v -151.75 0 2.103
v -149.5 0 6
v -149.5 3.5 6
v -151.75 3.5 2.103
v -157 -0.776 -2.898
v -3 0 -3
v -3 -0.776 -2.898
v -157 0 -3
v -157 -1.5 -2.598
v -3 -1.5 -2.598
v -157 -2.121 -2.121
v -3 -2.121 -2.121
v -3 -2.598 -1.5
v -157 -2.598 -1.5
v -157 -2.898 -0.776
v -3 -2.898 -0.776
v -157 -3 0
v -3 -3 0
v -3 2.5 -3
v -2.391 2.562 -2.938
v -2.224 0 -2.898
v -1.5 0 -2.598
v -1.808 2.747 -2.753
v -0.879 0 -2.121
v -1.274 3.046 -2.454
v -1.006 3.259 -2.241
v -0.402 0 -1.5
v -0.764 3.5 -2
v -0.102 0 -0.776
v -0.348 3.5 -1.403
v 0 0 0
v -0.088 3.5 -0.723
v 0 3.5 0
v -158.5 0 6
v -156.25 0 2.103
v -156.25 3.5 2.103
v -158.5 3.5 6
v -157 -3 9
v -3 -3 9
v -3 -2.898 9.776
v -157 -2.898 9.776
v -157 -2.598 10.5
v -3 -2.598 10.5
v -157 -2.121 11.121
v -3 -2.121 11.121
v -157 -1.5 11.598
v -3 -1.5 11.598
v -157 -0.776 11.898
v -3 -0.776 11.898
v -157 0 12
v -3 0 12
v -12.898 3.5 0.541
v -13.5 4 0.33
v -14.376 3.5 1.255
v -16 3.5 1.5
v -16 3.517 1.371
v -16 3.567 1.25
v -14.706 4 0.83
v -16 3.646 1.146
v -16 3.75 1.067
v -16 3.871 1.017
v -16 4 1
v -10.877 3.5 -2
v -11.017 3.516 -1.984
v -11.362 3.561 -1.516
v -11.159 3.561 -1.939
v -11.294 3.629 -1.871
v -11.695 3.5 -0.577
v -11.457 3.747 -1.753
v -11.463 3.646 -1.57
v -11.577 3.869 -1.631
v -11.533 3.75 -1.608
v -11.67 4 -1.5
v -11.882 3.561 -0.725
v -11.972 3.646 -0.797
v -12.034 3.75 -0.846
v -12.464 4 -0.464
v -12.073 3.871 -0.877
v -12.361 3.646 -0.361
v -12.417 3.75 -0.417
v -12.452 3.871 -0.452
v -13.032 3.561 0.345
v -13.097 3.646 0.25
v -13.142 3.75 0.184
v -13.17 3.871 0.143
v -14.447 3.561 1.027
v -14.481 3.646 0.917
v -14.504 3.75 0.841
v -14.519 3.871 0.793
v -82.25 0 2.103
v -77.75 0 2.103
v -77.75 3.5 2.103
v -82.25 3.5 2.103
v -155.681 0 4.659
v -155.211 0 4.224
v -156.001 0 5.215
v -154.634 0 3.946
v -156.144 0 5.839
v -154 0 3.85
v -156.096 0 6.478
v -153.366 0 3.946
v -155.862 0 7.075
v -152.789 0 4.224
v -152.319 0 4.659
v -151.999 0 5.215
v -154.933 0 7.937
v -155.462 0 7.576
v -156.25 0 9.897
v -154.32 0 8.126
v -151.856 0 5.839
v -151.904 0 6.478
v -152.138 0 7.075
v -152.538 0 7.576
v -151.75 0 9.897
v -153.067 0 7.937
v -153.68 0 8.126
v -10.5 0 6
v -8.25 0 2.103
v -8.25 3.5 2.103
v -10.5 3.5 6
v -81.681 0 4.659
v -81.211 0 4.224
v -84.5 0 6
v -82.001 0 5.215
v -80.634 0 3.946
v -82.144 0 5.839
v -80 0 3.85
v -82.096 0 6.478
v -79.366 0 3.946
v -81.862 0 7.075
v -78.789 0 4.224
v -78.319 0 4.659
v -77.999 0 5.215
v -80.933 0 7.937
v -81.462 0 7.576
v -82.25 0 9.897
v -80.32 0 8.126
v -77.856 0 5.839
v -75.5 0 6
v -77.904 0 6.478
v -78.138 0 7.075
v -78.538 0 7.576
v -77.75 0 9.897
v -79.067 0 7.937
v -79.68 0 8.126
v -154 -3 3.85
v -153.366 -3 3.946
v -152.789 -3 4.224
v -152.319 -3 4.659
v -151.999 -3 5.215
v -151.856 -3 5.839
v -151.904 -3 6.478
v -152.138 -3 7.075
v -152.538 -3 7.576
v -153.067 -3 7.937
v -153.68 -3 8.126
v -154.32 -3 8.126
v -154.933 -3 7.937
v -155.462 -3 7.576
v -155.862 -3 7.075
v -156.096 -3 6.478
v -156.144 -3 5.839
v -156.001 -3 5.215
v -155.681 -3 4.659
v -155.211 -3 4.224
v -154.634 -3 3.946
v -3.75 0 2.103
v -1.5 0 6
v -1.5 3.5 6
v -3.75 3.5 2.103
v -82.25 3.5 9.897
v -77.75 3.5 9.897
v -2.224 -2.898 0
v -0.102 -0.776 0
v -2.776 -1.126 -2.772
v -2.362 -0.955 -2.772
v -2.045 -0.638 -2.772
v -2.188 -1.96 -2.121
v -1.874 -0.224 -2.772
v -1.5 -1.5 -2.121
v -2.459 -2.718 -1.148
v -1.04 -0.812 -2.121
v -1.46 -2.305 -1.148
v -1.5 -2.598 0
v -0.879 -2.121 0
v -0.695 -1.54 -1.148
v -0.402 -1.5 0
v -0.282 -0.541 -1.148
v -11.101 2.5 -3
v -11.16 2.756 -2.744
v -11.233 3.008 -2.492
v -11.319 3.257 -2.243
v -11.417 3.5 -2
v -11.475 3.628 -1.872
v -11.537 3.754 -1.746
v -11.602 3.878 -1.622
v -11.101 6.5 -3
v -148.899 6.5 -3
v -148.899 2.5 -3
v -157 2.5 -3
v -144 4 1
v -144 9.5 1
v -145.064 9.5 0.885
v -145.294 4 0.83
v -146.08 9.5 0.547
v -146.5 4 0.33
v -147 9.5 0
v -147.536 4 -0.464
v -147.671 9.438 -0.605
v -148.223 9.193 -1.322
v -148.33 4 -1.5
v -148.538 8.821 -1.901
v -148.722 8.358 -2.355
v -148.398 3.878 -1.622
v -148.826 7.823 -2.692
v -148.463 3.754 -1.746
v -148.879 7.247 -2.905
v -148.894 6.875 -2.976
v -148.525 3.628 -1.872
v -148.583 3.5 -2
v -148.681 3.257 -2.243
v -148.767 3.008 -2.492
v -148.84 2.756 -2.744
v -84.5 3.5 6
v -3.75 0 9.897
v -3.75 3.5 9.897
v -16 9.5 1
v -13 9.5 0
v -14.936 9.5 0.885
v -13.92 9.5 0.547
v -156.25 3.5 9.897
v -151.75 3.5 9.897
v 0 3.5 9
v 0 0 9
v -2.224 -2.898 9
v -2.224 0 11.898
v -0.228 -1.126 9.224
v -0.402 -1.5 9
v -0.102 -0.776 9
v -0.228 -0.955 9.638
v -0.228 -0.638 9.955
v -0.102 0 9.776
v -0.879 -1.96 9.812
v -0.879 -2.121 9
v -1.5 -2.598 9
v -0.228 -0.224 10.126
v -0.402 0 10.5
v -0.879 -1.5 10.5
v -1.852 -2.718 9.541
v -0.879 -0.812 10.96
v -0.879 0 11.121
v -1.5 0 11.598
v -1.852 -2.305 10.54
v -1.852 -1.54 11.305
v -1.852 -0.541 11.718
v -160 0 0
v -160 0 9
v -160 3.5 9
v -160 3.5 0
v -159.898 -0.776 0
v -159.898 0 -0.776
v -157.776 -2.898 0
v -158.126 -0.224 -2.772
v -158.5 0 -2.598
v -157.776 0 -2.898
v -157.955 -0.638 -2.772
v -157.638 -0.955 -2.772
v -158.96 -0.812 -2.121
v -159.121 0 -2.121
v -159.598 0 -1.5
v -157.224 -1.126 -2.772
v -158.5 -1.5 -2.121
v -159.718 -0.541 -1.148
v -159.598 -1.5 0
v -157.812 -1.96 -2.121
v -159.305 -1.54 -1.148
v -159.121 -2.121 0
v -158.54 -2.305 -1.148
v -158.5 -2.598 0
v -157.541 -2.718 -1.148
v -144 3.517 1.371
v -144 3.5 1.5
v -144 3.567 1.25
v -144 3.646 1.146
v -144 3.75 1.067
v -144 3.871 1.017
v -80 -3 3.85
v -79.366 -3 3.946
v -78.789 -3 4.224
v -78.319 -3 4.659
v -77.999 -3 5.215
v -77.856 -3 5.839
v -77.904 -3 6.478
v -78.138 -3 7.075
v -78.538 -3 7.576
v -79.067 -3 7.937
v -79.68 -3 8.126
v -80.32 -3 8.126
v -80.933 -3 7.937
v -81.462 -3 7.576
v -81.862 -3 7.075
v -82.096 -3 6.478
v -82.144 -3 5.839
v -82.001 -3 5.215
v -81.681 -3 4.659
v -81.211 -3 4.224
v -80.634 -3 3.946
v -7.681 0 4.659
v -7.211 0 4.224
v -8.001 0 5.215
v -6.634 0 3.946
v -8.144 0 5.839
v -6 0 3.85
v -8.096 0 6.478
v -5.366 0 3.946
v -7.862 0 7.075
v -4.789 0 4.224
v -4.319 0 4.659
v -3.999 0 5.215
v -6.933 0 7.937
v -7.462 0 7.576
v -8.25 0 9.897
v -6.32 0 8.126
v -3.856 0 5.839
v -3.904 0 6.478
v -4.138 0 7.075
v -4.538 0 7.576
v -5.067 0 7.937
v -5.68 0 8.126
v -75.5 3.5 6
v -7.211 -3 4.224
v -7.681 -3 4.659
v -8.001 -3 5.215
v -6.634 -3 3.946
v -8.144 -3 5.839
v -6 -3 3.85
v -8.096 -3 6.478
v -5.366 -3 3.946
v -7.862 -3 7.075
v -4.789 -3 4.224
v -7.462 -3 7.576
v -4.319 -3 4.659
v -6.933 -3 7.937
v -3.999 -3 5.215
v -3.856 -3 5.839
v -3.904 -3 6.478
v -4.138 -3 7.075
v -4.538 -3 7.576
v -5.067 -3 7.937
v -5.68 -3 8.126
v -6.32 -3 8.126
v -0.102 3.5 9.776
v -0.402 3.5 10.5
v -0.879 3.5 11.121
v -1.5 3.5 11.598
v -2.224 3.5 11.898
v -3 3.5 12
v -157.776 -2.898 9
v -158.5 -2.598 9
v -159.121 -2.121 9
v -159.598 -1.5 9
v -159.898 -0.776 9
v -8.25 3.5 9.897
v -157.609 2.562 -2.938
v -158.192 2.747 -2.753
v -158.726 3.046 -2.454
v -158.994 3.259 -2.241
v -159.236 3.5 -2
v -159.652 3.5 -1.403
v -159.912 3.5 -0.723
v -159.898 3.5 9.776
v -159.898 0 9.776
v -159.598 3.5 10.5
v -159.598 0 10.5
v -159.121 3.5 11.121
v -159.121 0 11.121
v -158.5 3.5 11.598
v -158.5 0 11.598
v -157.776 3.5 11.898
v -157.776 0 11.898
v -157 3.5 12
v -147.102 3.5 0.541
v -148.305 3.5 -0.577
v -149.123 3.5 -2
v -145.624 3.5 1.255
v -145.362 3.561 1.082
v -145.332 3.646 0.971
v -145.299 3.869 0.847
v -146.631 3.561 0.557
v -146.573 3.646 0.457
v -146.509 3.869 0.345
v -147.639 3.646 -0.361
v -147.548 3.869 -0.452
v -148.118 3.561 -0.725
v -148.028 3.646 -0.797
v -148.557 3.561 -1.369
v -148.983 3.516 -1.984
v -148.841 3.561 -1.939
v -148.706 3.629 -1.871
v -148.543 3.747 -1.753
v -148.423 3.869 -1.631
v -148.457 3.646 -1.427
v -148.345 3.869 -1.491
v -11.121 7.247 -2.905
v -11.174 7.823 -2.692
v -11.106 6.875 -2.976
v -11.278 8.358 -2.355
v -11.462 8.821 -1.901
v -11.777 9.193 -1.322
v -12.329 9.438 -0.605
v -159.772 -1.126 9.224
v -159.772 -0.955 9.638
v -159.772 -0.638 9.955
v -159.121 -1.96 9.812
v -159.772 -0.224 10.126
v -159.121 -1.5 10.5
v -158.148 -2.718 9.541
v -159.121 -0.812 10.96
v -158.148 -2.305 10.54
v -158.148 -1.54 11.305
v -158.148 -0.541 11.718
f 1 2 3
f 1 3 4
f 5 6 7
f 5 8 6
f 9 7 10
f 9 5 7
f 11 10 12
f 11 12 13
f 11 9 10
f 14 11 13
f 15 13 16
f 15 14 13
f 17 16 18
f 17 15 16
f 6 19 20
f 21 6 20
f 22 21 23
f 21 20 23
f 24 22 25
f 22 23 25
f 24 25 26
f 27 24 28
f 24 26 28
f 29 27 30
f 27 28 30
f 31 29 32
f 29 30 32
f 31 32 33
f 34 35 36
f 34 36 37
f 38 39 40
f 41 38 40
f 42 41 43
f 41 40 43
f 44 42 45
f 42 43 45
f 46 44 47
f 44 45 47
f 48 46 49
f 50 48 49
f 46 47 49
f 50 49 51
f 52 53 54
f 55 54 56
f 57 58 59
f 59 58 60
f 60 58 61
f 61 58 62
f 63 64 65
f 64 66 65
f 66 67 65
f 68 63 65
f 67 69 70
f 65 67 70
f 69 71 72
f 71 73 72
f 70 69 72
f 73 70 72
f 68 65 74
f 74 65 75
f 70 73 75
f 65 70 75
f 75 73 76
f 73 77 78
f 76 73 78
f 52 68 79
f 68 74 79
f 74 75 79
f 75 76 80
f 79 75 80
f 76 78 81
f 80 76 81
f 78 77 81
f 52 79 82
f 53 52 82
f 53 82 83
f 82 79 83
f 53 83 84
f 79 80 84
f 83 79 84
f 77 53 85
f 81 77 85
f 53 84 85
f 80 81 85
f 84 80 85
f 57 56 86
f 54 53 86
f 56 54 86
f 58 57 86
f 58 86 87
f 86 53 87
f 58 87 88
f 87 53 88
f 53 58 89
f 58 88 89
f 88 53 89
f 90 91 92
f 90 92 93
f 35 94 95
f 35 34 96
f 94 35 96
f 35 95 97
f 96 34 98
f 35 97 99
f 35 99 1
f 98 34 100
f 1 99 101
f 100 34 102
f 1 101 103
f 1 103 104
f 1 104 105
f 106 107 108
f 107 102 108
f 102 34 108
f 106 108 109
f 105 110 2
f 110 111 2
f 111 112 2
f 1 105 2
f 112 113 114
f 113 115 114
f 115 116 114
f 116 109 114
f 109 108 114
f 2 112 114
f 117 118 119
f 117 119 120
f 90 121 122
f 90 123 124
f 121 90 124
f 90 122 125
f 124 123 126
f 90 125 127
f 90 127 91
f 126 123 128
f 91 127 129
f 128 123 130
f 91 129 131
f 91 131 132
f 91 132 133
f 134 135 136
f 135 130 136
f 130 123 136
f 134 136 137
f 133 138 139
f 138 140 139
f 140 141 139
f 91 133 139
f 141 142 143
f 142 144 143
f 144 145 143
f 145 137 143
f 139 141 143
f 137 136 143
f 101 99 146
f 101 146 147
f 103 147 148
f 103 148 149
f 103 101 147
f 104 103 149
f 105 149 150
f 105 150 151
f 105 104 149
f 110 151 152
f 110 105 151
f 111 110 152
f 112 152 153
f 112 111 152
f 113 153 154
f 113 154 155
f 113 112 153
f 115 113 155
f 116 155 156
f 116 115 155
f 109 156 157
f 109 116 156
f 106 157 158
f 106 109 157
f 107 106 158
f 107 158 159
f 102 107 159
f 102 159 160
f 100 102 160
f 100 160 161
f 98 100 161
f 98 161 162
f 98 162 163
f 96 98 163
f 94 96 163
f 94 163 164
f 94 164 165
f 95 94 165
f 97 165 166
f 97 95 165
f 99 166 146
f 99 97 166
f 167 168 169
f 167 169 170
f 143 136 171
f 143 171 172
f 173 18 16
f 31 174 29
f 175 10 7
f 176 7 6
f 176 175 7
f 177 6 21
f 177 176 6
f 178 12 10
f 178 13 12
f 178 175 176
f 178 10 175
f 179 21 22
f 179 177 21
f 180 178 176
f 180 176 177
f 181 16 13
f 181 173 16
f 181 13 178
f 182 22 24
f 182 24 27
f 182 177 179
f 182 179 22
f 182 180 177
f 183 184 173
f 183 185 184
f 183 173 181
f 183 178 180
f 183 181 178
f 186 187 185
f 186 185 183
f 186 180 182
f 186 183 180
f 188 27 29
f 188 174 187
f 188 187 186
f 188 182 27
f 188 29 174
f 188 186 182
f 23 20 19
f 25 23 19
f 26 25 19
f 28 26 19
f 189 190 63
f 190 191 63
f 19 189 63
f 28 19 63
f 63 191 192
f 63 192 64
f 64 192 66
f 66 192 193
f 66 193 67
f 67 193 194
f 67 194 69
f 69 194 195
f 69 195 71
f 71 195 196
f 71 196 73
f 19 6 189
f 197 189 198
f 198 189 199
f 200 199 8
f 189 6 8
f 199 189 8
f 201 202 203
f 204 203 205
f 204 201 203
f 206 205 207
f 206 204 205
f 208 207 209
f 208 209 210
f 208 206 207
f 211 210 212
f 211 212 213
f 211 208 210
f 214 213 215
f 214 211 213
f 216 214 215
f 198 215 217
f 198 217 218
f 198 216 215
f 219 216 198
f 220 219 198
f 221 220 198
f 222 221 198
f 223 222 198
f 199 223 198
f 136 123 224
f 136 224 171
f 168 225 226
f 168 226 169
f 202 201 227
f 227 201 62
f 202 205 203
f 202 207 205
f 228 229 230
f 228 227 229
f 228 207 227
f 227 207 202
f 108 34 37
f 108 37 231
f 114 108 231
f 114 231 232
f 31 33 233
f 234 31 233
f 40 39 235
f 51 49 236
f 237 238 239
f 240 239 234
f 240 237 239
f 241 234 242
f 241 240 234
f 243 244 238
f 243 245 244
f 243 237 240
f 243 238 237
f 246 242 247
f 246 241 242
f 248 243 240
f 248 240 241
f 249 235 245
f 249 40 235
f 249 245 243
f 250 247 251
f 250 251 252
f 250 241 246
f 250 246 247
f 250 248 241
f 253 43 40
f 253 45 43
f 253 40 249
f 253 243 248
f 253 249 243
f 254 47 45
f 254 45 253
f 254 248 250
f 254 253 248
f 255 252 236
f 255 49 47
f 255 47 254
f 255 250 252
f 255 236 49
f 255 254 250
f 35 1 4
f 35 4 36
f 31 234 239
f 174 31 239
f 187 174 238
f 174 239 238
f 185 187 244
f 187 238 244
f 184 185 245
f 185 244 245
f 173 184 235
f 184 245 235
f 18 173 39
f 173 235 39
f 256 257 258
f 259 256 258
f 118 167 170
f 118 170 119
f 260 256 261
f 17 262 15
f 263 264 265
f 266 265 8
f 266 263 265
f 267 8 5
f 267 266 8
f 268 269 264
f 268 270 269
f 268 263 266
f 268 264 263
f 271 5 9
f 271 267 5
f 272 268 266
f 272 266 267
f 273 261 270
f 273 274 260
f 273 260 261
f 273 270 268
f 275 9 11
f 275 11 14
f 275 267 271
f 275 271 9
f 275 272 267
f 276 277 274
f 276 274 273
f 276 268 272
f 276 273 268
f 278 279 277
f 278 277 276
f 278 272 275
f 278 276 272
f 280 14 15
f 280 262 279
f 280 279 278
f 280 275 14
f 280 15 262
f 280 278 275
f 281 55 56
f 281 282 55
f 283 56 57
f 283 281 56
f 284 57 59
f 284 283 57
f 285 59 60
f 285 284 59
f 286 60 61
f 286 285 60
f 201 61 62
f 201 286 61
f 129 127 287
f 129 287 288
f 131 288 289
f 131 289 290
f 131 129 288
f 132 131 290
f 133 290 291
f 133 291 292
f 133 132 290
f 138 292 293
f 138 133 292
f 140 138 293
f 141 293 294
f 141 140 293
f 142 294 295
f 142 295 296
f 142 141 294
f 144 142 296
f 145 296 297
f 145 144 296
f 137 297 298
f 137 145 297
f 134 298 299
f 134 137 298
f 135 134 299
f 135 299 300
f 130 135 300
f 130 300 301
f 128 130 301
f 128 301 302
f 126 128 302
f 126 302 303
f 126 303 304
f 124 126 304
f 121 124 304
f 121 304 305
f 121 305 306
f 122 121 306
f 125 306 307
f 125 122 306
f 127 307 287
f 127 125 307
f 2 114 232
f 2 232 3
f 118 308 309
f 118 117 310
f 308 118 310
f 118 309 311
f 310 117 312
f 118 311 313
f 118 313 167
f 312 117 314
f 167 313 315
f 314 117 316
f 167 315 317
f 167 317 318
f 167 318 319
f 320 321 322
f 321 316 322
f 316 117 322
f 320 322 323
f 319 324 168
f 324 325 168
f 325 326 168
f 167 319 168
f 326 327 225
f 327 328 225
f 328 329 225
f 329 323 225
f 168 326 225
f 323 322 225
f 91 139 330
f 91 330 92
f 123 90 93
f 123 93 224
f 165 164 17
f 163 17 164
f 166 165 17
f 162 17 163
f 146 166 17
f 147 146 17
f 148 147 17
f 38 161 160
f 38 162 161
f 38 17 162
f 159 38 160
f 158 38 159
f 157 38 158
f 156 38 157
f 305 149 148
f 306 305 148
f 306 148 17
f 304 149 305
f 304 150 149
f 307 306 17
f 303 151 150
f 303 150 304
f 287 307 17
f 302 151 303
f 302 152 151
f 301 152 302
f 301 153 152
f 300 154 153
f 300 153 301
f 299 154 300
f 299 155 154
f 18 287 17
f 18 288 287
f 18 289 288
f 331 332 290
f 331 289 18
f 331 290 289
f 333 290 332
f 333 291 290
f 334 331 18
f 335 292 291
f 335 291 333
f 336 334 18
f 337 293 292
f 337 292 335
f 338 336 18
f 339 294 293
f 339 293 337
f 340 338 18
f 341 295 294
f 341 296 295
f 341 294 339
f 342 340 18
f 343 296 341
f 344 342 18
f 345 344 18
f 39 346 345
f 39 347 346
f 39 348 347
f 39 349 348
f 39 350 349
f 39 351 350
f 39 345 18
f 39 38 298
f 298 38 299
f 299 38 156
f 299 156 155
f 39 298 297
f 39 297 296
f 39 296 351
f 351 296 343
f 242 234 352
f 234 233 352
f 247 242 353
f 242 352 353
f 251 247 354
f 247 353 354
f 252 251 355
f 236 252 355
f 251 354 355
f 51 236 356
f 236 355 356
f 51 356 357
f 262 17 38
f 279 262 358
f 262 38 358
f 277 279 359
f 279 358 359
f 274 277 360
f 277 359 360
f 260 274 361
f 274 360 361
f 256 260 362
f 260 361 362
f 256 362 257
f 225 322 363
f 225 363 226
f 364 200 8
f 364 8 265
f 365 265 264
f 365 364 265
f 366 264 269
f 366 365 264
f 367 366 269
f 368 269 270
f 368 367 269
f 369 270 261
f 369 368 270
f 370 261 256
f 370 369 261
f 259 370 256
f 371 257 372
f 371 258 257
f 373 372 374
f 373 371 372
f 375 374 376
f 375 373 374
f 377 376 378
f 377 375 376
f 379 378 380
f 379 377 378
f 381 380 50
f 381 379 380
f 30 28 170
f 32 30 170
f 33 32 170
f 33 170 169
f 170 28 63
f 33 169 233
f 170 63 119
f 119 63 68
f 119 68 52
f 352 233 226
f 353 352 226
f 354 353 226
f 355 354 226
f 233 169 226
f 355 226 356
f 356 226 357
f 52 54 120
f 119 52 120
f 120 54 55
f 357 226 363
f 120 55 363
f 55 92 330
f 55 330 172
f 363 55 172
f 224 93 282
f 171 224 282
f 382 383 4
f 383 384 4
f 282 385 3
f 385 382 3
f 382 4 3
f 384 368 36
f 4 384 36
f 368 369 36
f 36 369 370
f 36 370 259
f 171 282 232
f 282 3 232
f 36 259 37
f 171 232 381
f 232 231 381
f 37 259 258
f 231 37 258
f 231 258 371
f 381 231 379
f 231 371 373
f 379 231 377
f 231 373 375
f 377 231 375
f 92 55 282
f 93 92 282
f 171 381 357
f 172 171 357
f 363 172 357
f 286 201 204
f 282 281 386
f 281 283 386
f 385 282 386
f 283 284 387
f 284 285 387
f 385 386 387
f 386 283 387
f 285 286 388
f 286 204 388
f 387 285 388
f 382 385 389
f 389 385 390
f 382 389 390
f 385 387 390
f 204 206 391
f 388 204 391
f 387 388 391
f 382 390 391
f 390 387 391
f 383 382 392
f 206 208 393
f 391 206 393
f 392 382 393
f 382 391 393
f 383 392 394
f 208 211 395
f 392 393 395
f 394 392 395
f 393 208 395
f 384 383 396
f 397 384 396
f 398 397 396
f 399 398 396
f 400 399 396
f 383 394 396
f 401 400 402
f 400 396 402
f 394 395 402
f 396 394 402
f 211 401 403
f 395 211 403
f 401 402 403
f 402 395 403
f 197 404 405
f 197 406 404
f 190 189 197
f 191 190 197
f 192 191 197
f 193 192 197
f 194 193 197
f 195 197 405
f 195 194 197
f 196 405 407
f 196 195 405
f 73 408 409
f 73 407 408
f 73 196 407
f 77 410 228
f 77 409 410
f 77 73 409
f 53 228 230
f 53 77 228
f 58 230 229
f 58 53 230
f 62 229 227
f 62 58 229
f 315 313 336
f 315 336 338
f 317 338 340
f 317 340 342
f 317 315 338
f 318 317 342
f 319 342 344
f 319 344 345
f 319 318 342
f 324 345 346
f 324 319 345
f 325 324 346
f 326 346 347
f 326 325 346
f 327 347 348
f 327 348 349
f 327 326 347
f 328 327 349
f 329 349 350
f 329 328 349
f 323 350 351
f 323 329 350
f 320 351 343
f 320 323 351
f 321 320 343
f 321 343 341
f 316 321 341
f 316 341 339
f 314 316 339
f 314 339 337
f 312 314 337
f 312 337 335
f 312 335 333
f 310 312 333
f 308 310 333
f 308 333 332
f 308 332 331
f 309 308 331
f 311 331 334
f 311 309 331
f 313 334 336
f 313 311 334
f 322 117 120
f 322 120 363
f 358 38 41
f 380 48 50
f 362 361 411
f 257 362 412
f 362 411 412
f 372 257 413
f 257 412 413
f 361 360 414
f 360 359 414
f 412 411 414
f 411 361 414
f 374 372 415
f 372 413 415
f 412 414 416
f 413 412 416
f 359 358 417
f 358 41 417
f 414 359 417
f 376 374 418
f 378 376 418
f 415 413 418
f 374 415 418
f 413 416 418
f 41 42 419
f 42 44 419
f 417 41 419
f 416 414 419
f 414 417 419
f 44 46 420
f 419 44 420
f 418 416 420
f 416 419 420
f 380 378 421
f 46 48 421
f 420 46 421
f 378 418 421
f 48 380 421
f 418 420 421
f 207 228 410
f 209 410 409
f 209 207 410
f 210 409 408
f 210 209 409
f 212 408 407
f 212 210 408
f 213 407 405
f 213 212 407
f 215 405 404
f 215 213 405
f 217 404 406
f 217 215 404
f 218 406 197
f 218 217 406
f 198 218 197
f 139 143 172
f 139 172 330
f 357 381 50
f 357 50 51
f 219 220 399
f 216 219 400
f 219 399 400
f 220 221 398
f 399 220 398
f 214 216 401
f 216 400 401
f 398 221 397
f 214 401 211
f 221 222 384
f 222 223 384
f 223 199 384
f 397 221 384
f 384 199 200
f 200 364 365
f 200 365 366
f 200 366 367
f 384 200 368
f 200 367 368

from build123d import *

# Parameters (mm, degrees)
SKETCH1_W                = 160
SKETCH1_H                = 12
BOSS_EXTRUDE1_DEPTH      = 3.5
SKETCH2_W                = 160
SKETCH2_H                = 12
SKETCH2_R                = 2.15
BOSS_EXTRUDE2_DEPTH      = 3
BOSS_EXTRUDE3_DEPTH      = 6
BOSS_EXTRUDE3_DEPTH_BACK = 6.5
CAVITY1_START            = 2.5
CAVITY1_DEPTH            = 7.5
CAVITY1_START_2          = -160
CAVITY1_2_DEPTH          = 160
FILLET2_R                = 3
FILLET3_R                = 3
FILLET4_R                = 0.5


with BuildPart() as part:
    # Sketch1 → Boss-Extrude1 (new body)
    with BuildSketch(Plane(origin=(0, 0, 0), x_dir=(1, 0, 0), z_dir=(0, 1, 0))):
        with Locations((-80, -6)):
            Rectangle(SKETCH1_W, SKETCH1_H)
        Polygon((-75.5, -6), (-77.75, -2.102885683), (-82.25, -2.102885683), (-84.5, -6), (-82.25, -9.897114317), (-77.75, -9.897114317), align=None, mode=Mode.SUBTRACT)
        Polygon((-149.5, -6), (-151.75, -2.102885683), (-156.25, -2.102885683), (-158.5, -6), (-156.25, -9.897114317), (-151.75, -9.897114317), align=None, mode=Mode.SUBTRACT)
        Polygon((-10.5, -6), (-8.25, -9.897114317), (-3.75, -9.897114317), (-1.5, -6), (-3.75, -2.102885683), (-8.25, -2.102885683), align=None, mode=Mode.SUBTRACT)
    extrude(amount=BOSS_EXTRUDE1_DEPTH)

    # Sketch2 → Boss-Extrude2 (add)
    with BuildSketch(Plane.XZ):
        with Locations((-80, 6)):
            Rectangle(SKETCH2_W, SKETCH2_H)
        with Locations(Location((-154, 6, 0), (0, 0, 270))):
            Circle(SKETCH2_R, mode=Mode.SUBTRACT)
        with Locations(Location((-80, 6, 0), (0, 0, 270))):
            Circle(SKETCH2_R, mode=Mode.SUBTRACT)
        with Locations(Location((-6, 6, 0), (0, 0, 270))):
            Circle(SKETCH2_R, mode=Mode.SUBTRACT)
    extrude(amount=BOSS_EXTRUDE2_DEPTH)

    # Sketch3 → Boss-Extrude3 (add, two sides: drawn at the far end of the back side and taken through both)
    with BuildSketch(Plane(origin=(0, 3.5, 0), x_dir=(1, 0, 0), z_dir=(0, 1, 0)).offset(-BOSS_EXTRUDE3_DEPTH_BACK)):
        Polygon((-80, -1), (0, -1), (0, 3), (-160, 3), (-160, -1), align=None)
    extrude(amount=BOSS_EXTRUDE3_DEPTH + BOSS_EXTRUDE3_DEPTH_BACK)

    # Cavity1: read off the stored shape, not the designer's step
    # Cavity1 outline → Cavity1 (cut)
    with BuildSketch(Plane(origin=(0, 0, 0), x_dir=(1, 0, 0), z_dir=(0, 1, 0)).offset(CAVITY1_START)):
        with BuildLine():
            ThreePointArc((-11.101020514, 3), (-12.83772234, 0.127016654), (-16, -1))
            Line((-16, -1), (0, -1))
            Line((0, -1), (0, 3))
            Line((0, 3), (-11.101020514, 3))
        make_face()
        with BuildLine():
            Line((-160, -1), (-144, -1))
            ThreePointArc((-144, -1), (-147.16227766, 0.127016654), (-148.898979486, 3))
            Line((-148.898979486, 3), (-160, 3))
            Line((-160, 3), (-160, -1))
        make_face()
    extrude(amount=CAVITY1_DEPTH, mode=Mode.SUBTRACT)

    # Cavity1 2 outline → Cavity1 2 (add)
    with BuildSketch(Plane.YZ.offset(CAVITY1_START_2)):
        Polygon((2.5, -3), (3.5, -2), (3.5, 1), (2.5, 1), align=None)
    extrude(amount=CAVITY1_2_DEPTH)

    # Fillet2
    fillet2_edges = [part.edges().sort_by_distance(p)[0] for p in [
        (-80, 9.5, -3),
    ]]
    fillet(fillet2_edges, radius=FILLET2_R)

    # Fillet3
    fillet3_edges = [part.edges().sort_by_distance(p)[0] for p in [
        (-80, -3, 12),
        (0, -3, 4.5),
        (-160, -3, 4.5),
        (-160, -0.25, -3),
        (-80, -3, -3),
        (0, -0.25, -3),
        (-160, 0.25, 12),
        (0, 0.25, 12),
    ]]
    fillet(fillet3_edges, radius=FILLET3_R)

    # Fillet4
    fillet4_edges = [part.edges().sort_by_distance(p)[0] for p in [
        (-80, 3.5, 1),
        (-146.738612787, 3.5, 0.183300132),
        (-13.261387213, 3.5, 0.183300132),
    ]]
    fillet(fillet4_edges, radius=FILLET4_R)


solid = part.part
